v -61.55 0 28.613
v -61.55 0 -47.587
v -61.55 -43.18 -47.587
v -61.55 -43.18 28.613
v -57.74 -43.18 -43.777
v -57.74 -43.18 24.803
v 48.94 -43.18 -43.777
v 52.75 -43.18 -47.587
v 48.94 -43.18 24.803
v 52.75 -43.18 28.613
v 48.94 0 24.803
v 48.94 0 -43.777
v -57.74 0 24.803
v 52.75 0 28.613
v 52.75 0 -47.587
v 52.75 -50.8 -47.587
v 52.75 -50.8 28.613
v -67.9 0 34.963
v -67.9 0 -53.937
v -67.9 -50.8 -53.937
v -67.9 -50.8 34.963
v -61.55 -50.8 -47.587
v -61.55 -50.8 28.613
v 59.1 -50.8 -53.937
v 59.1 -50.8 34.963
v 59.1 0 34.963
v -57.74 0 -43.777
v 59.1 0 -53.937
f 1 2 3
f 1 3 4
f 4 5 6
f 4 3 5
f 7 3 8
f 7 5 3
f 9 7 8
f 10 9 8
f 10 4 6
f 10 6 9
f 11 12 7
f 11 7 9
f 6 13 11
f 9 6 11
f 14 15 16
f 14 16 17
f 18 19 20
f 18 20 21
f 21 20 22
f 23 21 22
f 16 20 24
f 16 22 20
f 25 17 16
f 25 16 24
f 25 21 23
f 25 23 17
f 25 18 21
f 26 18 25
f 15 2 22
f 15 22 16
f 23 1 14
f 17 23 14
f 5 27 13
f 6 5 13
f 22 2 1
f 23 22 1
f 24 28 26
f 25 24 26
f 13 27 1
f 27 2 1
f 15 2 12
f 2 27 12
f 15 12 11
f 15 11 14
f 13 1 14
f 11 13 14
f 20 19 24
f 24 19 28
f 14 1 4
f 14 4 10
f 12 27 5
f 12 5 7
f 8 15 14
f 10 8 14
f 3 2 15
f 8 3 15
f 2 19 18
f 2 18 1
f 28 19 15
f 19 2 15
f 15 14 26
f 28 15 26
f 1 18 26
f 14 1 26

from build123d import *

# Parameters (mm, degrees)
F0_W     = 114.3
F0_H     = 76.2
F0_W_2   = 106.68
F0_H_2   = 68.58
F1_DEPTH = 43.18
F0_W_3   = 127
F0_H_3   = 88.9
F2_DEPTH = 50.8


with BuildPart() as f1:
    # F0 (on Front) → F1 (new body)
    with BuildSketch(Plane.XZ):
        with Locations((-4.400184, -9.486784)):
            Rectangle(F0_W, F0_H)
        with Locations((-4.400184, -9.486784)):
            Rectangle(F0_W_2, F0_H_2, mode=Mode.SUBTRACT)
    extrude(amount=F1_DEPTH)


with BuildPart() as f2:
    # F0 (on Front) → F2 (new body)
    with BuildSketch(Plane.XZ):
        with Locations((-4.400184, -9.486784)):
            Rectangle(F0_W_3, F0_H_3)
        with Locations((-4.400184, -9.486784)):
            Rectangle(F0_W, F0_H, mode=Mode.SUBTRACT)
    extrude(amount=F2_DEPTH)


solid = Compound([f1.part, f2.part])
